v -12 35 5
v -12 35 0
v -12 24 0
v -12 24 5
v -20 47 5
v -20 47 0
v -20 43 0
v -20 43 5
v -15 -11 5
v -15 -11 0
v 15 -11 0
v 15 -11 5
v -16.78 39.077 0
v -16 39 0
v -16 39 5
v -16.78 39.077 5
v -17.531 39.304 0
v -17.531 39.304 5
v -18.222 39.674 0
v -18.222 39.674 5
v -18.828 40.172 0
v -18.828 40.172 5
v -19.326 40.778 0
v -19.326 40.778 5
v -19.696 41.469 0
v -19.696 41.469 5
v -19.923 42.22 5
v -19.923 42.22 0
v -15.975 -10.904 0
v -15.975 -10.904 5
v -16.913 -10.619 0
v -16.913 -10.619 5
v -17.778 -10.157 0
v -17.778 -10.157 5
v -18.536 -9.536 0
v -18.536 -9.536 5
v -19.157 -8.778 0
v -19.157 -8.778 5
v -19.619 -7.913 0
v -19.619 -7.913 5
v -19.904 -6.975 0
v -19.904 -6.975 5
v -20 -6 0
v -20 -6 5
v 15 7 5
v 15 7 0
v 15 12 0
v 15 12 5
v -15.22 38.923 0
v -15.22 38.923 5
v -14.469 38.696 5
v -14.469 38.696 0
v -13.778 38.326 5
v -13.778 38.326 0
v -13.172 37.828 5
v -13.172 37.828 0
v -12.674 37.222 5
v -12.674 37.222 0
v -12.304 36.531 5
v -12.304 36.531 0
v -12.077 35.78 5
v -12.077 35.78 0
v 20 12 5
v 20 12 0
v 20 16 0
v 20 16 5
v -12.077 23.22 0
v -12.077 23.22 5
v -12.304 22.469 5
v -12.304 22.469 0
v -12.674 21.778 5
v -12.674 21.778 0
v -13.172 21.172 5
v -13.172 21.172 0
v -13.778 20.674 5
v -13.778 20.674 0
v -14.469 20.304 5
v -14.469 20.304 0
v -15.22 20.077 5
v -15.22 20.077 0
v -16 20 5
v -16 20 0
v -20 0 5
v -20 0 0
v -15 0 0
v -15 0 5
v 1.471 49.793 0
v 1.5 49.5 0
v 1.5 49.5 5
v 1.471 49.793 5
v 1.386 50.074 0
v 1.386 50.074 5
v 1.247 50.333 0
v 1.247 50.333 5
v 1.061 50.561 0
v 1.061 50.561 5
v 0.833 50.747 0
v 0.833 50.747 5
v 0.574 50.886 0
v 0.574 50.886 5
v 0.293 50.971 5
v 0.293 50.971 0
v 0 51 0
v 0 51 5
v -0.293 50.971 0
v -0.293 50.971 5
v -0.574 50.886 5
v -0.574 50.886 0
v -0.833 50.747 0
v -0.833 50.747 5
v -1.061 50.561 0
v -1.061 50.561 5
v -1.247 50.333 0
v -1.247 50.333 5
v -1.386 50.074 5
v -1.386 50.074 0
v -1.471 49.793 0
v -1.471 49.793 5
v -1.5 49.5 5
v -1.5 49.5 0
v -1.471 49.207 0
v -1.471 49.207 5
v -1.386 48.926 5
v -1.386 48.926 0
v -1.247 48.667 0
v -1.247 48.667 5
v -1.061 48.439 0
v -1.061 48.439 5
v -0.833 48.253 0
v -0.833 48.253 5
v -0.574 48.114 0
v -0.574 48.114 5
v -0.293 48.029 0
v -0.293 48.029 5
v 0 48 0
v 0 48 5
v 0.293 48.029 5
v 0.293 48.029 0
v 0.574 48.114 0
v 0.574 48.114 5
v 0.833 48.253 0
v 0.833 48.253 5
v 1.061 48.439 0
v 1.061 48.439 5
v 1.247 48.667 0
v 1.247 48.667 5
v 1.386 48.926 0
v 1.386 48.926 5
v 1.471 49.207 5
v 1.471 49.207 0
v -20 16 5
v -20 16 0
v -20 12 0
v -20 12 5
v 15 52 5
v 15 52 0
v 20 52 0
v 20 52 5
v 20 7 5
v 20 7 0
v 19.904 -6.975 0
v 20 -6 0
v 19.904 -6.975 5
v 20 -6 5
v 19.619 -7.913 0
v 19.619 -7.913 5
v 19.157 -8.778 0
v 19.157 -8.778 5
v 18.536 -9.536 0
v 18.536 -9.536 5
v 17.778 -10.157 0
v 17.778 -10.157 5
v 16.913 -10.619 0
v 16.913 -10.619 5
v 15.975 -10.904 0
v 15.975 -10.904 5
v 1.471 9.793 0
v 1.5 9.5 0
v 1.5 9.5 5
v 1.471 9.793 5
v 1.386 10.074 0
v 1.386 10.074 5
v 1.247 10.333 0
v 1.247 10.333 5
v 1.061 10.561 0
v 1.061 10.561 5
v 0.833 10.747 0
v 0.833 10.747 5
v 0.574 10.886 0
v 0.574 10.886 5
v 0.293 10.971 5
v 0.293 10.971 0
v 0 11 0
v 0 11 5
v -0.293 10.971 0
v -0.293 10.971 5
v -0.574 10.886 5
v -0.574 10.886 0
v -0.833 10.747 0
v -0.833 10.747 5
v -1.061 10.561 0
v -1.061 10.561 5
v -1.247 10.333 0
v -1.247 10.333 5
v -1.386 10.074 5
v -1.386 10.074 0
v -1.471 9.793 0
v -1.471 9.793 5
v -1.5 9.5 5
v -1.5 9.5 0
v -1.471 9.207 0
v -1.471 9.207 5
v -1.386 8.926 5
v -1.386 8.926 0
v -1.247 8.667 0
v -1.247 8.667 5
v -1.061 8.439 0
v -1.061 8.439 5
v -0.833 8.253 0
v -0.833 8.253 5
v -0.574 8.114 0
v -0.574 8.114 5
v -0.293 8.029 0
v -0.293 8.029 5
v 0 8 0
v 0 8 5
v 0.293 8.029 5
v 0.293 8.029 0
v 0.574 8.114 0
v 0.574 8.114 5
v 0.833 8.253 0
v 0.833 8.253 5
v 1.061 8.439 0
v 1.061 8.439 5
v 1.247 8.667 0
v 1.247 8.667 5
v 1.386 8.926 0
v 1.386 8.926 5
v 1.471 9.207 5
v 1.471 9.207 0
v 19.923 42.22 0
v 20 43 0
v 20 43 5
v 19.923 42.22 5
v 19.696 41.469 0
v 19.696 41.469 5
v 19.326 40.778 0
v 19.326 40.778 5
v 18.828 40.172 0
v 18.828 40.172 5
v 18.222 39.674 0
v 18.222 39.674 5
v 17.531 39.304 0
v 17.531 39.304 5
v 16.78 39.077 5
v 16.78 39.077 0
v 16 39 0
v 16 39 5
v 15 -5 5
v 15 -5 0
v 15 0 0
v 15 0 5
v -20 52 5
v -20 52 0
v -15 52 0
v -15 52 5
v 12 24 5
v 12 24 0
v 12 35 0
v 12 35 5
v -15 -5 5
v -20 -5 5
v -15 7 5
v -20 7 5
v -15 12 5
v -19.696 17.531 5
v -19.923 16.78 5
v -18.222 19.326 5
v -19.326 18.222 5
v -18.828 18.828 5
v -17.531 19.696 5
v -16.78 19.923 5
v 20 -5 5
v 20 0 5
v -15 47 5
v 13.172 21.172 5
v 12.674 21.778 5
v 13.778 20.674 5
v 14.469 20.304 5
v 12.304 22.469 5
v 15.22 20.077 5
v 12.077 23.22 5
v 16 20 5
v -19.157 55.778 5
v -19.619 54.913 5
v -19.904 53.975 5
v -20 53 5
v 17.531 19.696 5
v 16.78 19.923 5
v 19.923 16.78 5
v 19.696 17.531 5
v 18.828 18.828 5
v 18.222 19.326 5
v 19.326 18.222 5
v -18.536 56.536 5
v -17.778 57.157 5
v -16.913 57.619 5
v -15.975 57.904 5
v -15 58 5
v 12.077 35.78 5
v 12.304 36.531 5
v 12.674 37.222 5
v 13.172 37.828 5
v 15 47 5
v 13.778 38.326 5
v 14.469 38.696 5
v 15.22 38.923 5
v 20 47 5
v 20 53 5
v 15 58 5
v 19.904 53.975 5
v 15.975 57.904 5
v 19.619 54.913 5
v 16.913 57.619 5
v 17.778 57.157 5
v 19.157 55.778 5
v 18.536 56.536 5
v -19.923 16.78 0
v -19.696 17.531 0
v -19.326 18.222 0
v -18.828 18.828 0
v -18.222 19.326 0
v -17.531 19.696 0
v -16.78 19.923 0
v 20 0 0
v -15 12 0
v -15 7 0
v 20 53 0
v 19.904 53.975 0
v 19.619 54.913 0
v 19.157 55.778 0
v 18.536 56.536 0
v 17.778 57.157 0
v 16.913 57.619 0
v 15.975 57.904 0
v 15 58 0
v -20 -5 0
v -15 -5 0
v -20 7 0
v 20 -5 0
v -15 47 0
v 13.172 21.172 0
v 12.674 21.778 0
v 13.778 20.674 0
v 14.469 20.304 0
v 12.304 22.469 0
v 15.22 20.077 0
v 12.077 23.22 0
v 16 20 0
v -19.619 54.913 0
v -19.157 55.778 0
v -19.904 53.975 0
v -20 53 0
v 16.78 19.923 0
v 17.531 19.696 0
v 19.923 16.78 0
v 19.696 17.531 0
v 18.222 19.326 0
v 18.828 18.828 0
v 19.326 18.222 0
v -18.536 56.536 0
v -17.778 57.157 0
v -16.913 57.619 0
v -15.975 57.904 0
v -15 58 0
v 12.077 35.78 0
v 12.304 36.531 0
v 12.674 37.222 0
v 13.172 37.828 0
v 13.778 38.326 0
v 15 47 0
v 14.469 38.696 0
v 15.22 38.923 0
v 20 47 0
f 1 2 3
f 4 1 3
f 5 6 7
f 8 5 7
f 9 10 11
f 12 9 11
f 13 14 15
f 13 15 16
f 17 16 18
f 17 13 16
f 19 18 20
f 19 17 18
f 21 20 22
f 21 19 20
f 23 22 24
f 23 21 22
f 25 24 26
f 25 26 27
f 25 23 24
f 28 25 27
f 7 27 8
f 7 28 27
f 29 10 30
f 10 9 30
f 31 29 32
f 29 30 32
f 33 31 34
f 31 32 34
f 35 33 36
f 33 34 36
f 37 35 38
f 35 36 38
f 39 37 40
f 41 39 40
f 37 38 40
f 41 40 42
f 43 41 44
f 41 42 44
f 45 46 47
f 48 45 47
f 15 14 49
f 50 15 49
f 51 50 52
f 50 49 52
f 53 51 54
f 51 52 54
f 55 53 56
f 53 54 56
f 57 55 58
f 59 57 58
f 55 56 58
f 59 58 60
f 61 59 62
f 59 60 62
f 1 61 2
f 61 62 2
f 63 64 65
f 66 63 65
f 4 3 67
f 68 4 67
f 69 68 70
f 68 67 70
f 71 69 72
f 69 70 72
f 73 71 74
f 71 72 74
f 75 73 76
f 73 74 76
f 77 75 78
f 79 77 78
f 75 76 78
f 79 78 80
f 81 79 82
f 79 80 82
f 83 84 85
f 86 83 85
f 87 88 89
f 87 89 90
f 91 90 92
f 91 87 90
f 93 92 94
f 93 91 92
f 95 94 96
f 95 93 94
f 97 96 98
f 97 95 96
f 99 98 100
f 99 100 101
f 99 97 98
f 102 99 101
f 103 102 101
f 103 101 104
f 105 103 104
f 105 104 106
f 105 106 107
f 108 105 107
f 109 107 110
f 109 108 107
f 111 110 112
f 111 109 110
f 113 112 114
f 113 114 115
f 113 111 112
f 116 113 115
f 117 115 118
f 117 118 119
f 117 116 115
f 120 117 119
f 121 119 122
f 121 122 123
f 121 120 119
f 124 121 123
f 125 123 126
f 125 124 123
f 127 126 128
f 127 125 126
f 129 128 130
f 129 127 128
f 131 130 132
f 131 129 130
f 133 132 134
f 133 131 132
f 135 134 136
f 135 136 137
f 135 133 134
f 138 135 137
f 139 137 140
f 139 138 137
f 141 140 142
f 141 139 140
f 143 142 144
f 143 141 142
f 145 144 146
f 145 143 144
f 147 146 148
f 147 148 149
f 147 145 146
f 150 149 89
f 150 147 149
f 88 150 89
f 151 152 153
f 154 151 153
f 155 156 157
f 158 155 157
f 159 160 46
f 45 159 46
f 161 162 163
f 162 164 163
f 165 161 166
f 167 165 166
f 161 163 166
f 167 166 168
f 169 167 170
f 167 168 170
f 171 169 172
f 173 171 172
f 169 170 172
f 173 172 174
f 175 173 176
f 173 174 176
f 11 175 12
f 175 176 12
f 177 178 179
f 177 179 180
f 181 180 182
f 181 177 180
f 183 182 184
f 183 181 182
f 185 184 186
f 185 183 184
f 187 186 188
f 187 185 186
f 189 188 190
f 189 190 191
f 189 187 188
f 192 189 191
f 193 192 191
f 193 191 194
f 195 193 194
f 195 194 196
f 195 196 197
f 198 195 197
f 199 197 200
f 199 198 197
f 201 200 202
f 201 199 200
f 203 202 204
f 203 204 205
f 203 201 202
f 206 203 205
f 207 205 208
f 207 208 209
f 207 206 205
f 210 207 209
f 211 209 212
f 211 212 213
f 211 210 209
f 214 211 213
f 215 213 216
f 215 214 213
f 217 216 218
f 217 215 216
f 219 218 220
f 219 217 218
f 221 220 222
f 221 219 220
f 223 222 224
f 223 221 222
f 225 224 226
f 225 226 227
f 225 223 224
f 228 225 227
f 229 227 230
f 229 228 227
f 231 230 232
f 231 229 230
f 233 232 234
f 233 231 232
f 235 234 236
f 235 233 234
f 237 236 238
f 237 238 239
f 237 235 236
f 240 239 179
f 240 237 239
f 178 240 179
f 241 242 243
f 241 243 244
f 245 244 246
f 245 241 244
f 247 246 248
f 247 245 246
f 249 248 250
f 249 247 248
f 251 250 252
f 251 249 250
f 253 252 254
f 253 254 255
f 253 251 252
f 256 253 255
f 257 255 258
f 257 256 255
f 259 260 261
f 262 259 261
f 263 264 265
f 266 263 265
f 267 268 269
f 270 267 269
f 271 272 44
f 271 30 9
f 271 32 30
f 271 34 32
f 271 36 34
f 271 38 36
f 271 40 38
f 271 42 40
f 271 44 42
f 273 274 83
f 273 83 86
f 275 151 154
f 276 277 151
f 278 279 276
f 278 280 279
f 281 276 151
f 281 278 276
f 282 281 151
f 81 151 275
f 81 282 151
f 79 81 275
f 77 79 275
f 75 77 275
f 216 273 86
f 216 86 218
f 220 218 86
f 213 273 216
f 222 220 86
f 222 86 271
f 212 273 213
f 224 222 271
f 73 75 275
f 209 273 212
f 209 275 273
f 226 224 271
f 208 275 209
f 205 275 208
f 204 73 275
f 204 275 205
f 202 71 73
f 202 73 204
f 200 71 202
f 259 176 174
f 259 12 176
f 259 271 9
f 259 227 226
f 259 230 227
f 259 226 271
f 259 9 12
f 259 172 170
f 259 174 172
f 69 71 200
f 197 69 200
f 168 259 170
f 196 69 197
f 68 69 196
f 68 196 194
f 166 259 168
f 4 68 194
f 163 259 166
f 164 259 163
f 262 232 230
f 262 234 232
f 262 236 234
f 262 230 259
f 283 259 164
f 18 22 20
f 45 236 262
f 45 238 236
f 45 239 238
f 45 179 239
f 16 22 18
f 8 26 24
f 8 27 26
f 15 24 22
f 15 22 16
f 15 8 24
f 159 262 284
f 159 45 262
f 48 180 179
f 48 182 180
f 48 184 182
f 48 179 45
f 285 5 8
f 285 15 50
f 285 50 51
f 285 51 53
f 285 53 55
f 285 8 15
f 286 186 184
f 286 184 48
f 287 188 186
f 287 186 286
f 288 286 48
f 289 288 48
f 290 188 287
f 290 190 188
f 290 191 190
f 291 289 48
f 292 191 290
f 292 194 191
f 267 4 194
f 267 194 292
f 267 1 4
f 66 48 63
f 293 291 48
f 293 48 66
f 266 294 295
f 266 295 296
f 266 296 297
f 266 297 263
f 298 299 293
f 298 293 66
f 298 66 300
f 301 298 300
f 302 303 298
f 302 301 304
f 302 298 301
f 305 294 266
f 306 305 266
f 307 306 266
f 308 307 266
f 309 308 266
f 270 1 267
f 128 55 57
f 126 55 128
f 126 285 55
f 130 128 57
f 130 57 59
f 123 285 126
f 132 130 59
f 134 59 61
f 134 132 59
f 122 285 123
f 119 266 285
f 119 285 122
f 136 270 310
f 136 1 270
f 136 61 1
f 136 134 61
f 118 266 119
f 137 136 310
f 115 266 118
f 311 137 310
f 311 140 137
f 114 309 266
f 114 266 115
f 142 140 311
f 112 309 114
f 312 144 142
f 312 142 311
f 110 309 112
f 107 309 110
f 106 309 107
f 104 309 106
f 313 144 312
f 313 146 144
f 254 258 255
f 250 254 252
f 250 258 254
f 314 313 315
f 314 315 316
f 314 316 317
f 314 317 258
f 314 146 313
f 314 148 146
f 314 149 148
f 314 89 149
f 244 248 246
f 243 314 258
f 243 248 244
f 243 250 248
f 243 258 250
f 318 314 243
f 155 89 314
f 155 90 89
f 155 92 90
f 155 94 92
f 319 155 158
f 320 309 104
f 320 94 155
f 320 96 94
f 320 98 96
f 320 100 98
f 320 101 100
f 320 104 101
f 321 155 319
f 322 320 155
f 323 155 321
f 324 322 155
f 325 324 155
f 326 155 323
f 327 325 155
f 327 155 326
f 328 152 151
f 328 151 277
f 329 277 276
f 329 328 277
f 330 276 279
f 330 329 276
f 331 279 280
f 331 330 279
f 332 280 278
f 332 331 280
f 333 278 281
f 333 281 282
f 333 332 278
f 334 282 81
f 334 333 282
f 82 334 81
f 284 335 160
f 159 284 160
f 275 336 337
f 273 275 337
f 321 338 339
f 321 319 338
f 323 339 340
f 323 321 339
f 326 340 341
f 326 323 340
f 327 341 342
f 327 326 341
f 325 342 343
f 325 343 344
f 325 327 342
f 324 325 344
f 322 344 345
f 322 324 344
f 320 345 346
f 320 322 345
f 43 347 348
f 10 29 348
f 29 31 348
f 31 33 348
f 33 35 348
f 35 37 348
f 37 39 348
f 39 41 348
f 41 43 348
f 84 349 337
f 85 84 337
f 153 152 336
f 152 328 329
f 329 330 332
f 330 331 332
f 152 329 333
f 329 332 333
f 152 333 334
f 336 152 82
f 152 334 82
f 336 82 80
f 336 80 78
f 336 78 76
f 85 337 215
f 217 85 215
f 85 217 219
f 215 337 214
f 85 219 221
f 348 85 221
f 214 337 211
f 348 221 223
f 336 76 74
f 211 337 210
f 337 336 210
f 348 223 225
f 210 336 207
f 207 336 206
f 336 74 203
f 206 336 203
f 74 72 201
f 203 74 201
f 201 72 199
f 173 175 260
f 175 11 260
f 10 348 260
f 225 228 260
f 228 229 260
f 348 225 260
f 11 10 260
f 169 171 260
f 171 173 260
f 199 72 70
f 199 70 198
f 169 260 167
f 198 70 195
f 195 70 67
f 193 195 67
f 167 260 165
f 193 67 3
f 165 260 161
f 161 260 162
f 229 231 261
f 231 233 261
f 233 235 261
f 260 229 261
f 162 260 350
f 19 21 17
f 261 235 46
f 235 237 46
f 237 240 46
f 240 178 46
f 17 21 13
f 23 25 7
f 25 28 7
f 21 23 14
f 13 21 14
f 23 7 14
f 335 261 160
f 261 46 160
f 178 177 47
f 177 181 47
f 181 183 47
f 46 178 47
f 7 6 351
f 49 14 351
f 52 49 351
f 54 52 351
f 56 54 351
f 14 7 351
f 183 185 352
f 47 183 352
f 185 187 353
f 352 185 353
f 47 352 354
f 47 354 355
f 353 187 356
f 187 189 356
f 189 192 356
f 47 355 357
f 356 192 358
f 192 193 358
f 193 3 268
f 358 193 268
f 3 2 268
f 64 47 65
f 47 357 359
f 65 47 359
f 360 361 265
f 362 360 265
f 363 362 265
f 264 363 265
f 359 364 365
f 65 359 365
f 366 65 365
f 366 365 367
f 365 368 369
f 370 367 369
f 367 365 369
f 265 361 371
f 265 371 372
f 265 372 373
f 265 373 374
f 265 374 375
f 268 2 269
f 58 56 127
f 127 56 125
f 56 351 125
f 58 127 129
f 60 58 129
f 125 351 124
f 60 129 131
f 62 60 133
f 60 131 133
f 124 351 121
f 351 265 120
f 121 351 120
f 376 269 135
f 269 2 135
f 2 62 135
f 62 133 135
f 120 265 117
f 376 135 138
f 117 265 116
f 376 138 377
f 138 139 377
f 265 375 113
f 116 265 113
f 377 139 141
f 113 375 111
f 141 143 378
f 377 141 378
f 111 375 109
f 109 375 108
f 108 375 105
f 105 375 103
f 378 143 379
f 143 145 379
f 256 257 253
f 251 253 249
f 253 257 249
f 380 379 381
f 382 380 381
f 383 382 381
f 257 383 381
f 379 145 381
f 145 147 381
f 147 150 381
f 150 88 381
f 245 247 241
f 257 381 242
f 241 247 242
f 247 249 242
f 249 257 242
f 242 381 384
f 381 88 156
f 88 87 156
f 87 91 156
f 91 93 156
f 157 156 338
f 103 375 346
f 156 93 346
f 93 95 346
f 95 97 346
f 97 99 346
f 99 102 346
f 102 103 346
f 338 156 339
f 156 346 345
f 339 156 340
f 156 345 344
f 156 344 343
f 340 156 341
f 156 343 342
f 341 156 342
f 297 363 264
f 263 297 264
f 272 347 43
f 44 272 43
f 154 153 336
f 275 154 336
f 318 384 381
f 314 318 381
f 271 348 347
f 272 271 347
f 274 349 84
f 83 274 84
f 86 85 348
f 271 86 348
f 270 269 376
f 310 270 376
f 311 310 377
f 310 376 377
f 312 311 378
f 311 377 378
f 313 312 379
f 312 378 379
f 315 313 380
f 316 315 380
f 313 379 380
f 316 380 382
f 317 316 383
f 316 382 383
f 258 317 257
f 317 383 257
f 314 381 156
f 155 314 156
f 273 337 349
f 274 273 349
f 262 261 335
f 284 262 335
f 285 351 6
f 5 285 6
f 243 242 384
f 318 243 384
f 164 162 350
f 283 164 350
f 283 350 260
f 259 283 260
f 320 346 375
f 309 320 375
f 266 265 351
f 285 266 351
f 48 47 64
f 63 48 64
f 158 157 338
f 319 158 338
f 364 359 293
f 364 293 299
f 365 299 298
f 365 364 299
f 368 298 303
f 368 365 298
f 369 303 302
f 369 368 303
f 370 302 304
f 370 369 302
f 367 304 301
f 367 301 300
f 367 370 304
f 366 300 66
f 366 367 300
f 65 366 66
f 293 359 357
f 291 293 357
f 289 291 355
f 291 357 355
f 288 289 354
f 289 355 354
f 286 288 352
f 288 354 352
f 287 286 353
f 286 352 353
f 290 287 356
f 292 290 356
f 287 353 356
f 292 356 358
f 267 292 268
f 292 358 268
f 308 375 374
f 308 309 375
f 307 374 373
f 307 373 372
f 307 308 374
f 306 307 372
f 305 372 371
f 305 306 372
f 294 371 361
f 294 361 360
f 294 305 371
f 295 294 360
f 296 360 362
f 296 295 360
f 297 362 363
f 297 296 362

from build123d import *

# Parameters (mm, degrees)
ESQUISSE1_R        = 1.5
BOSS_EXTRU_1_DEPTH = 5
CONG_1_R           = 5
CONG_3_START       = -1
CONG_3_DEPTH       = 7
CONG_3_2_DEPTH     = 5


with BuildPart() as part:
    # Esquisse1 → Boss.-Extru.1 (new body)
    with BuildSketch(Plane.XY):
        Polygon((20, 0), (20, 7), (15, 7), (15, 12), (20, 12), (20, 20), (12, 20), (12, 39), (20, 39), (20, 47), (15, 47), (15, 52), (20, 52), (20, 58), (-20, 58), (-20, 52), (-15, 52), (-15, 47), (-20, 47), (-20, 39), (-12, 39), (-12, 20), (-20, 20), (-20, 12), (-15, 12), (-15, 7), (-20, 7), (-20, 0), (-15, 0), (-15, -5), (-20, -5), (-20, -11), (20, -11), (20, -5), (15, -5), (15, 0), align=None)
        with Locations((0, 49.5)):
            Circle(ESQUISSE1_R, mode=Mode.SUBTRACT)
        with Locations((0, 9.5)):
            Circle(ESQUISSE1_R, mode=Mode.SUBTRACT)
    extrude(amount=BOSS_EXTRU_1_DEPTH)

    # Congé1
    cong_1_edges = [part.edges().sort_by_distance(p)[0] for p in [
        (-20, 58, 2.5),
        (20, 58, 2.5),
        (20, -11, 2.5),
        (-20, -11, 2.5),
    ]]
    fillet(cong_1_edges, radius=CONG_1_R)

    # Congé3: read off the stored shape, not the designer's step
    # Congé3 outline → Congé3 (cut)
    with BuildSketch(Plane.XY.offset(CONG_3_START)):
        with BuildLine():
            Line((20, 20), (16, 20))
            ThreePointArc((16, 20), (18.828427125, 18.828427125), (20, 16))
            Line((20, 16), (20, 20))
        make_face()
        with BuildLine():
            ThreePointArc((20, 43), (18.828427125, 40.171572875), (16, 39))
            Line((16, 39), (20, 39))
            Line((20, 39), (20, 43))
        make_face()
        with BuildLine():
            Line((-20, 39), (-16, 39))
            ThreePointArc((-16, 39), (-18.828427125, 40.171572875), (-20, 43))
            Line((-20, 43), (-20, 39))
        make_face()
        with BuildLine():
            ThreePointArc((-20, 16), (-18.828427125, 18.828427125), (-16, 20))
            Line((-16, 20), (-20, 20))
            Line((-20, 20), (-20, 16))
        make_face()
    extrude(amount=CONG_3_DEPTH, mode=Mode.SUBTRACT)

    # Cong_3 2 outline → Cong_3 2 (add)
    with BuildSketch(Plane.XY):
        with BuildLine():
            Line((12, 39), (12, 35))
            ThreePointArc((12, 35), (13.171572875, 37.828427125), (16, 39))
            Line((16, 39), (12, 39))
        make_face()
        with BuildLine():
            ThreePointArc((16, 20), (13.171572875, 21.171572875), (12, 24))
            Line((12, 24), (12, 20))
            Line((12, 20), (16, 20))
        make_face()
        with BuildLine():
            ThreePointArc((-16, 39), (-13.171572875, 37.828427125), (-12, 35))
            Line((-12, 35), (-12, 39))
            Line((-12, 39), (-16, 39))
        make_face()
        with BuildLine():
            ThreePointArc((-12, 24), (-13.171572875, 21.171572875), (-16, 20))
            Line((-16, 20), (-12, 20))
            Line((-12, 20), (-12, 24))
        make_face()
    extrude(amount=CONG_3_2_DEPTH)


solid = part.part
